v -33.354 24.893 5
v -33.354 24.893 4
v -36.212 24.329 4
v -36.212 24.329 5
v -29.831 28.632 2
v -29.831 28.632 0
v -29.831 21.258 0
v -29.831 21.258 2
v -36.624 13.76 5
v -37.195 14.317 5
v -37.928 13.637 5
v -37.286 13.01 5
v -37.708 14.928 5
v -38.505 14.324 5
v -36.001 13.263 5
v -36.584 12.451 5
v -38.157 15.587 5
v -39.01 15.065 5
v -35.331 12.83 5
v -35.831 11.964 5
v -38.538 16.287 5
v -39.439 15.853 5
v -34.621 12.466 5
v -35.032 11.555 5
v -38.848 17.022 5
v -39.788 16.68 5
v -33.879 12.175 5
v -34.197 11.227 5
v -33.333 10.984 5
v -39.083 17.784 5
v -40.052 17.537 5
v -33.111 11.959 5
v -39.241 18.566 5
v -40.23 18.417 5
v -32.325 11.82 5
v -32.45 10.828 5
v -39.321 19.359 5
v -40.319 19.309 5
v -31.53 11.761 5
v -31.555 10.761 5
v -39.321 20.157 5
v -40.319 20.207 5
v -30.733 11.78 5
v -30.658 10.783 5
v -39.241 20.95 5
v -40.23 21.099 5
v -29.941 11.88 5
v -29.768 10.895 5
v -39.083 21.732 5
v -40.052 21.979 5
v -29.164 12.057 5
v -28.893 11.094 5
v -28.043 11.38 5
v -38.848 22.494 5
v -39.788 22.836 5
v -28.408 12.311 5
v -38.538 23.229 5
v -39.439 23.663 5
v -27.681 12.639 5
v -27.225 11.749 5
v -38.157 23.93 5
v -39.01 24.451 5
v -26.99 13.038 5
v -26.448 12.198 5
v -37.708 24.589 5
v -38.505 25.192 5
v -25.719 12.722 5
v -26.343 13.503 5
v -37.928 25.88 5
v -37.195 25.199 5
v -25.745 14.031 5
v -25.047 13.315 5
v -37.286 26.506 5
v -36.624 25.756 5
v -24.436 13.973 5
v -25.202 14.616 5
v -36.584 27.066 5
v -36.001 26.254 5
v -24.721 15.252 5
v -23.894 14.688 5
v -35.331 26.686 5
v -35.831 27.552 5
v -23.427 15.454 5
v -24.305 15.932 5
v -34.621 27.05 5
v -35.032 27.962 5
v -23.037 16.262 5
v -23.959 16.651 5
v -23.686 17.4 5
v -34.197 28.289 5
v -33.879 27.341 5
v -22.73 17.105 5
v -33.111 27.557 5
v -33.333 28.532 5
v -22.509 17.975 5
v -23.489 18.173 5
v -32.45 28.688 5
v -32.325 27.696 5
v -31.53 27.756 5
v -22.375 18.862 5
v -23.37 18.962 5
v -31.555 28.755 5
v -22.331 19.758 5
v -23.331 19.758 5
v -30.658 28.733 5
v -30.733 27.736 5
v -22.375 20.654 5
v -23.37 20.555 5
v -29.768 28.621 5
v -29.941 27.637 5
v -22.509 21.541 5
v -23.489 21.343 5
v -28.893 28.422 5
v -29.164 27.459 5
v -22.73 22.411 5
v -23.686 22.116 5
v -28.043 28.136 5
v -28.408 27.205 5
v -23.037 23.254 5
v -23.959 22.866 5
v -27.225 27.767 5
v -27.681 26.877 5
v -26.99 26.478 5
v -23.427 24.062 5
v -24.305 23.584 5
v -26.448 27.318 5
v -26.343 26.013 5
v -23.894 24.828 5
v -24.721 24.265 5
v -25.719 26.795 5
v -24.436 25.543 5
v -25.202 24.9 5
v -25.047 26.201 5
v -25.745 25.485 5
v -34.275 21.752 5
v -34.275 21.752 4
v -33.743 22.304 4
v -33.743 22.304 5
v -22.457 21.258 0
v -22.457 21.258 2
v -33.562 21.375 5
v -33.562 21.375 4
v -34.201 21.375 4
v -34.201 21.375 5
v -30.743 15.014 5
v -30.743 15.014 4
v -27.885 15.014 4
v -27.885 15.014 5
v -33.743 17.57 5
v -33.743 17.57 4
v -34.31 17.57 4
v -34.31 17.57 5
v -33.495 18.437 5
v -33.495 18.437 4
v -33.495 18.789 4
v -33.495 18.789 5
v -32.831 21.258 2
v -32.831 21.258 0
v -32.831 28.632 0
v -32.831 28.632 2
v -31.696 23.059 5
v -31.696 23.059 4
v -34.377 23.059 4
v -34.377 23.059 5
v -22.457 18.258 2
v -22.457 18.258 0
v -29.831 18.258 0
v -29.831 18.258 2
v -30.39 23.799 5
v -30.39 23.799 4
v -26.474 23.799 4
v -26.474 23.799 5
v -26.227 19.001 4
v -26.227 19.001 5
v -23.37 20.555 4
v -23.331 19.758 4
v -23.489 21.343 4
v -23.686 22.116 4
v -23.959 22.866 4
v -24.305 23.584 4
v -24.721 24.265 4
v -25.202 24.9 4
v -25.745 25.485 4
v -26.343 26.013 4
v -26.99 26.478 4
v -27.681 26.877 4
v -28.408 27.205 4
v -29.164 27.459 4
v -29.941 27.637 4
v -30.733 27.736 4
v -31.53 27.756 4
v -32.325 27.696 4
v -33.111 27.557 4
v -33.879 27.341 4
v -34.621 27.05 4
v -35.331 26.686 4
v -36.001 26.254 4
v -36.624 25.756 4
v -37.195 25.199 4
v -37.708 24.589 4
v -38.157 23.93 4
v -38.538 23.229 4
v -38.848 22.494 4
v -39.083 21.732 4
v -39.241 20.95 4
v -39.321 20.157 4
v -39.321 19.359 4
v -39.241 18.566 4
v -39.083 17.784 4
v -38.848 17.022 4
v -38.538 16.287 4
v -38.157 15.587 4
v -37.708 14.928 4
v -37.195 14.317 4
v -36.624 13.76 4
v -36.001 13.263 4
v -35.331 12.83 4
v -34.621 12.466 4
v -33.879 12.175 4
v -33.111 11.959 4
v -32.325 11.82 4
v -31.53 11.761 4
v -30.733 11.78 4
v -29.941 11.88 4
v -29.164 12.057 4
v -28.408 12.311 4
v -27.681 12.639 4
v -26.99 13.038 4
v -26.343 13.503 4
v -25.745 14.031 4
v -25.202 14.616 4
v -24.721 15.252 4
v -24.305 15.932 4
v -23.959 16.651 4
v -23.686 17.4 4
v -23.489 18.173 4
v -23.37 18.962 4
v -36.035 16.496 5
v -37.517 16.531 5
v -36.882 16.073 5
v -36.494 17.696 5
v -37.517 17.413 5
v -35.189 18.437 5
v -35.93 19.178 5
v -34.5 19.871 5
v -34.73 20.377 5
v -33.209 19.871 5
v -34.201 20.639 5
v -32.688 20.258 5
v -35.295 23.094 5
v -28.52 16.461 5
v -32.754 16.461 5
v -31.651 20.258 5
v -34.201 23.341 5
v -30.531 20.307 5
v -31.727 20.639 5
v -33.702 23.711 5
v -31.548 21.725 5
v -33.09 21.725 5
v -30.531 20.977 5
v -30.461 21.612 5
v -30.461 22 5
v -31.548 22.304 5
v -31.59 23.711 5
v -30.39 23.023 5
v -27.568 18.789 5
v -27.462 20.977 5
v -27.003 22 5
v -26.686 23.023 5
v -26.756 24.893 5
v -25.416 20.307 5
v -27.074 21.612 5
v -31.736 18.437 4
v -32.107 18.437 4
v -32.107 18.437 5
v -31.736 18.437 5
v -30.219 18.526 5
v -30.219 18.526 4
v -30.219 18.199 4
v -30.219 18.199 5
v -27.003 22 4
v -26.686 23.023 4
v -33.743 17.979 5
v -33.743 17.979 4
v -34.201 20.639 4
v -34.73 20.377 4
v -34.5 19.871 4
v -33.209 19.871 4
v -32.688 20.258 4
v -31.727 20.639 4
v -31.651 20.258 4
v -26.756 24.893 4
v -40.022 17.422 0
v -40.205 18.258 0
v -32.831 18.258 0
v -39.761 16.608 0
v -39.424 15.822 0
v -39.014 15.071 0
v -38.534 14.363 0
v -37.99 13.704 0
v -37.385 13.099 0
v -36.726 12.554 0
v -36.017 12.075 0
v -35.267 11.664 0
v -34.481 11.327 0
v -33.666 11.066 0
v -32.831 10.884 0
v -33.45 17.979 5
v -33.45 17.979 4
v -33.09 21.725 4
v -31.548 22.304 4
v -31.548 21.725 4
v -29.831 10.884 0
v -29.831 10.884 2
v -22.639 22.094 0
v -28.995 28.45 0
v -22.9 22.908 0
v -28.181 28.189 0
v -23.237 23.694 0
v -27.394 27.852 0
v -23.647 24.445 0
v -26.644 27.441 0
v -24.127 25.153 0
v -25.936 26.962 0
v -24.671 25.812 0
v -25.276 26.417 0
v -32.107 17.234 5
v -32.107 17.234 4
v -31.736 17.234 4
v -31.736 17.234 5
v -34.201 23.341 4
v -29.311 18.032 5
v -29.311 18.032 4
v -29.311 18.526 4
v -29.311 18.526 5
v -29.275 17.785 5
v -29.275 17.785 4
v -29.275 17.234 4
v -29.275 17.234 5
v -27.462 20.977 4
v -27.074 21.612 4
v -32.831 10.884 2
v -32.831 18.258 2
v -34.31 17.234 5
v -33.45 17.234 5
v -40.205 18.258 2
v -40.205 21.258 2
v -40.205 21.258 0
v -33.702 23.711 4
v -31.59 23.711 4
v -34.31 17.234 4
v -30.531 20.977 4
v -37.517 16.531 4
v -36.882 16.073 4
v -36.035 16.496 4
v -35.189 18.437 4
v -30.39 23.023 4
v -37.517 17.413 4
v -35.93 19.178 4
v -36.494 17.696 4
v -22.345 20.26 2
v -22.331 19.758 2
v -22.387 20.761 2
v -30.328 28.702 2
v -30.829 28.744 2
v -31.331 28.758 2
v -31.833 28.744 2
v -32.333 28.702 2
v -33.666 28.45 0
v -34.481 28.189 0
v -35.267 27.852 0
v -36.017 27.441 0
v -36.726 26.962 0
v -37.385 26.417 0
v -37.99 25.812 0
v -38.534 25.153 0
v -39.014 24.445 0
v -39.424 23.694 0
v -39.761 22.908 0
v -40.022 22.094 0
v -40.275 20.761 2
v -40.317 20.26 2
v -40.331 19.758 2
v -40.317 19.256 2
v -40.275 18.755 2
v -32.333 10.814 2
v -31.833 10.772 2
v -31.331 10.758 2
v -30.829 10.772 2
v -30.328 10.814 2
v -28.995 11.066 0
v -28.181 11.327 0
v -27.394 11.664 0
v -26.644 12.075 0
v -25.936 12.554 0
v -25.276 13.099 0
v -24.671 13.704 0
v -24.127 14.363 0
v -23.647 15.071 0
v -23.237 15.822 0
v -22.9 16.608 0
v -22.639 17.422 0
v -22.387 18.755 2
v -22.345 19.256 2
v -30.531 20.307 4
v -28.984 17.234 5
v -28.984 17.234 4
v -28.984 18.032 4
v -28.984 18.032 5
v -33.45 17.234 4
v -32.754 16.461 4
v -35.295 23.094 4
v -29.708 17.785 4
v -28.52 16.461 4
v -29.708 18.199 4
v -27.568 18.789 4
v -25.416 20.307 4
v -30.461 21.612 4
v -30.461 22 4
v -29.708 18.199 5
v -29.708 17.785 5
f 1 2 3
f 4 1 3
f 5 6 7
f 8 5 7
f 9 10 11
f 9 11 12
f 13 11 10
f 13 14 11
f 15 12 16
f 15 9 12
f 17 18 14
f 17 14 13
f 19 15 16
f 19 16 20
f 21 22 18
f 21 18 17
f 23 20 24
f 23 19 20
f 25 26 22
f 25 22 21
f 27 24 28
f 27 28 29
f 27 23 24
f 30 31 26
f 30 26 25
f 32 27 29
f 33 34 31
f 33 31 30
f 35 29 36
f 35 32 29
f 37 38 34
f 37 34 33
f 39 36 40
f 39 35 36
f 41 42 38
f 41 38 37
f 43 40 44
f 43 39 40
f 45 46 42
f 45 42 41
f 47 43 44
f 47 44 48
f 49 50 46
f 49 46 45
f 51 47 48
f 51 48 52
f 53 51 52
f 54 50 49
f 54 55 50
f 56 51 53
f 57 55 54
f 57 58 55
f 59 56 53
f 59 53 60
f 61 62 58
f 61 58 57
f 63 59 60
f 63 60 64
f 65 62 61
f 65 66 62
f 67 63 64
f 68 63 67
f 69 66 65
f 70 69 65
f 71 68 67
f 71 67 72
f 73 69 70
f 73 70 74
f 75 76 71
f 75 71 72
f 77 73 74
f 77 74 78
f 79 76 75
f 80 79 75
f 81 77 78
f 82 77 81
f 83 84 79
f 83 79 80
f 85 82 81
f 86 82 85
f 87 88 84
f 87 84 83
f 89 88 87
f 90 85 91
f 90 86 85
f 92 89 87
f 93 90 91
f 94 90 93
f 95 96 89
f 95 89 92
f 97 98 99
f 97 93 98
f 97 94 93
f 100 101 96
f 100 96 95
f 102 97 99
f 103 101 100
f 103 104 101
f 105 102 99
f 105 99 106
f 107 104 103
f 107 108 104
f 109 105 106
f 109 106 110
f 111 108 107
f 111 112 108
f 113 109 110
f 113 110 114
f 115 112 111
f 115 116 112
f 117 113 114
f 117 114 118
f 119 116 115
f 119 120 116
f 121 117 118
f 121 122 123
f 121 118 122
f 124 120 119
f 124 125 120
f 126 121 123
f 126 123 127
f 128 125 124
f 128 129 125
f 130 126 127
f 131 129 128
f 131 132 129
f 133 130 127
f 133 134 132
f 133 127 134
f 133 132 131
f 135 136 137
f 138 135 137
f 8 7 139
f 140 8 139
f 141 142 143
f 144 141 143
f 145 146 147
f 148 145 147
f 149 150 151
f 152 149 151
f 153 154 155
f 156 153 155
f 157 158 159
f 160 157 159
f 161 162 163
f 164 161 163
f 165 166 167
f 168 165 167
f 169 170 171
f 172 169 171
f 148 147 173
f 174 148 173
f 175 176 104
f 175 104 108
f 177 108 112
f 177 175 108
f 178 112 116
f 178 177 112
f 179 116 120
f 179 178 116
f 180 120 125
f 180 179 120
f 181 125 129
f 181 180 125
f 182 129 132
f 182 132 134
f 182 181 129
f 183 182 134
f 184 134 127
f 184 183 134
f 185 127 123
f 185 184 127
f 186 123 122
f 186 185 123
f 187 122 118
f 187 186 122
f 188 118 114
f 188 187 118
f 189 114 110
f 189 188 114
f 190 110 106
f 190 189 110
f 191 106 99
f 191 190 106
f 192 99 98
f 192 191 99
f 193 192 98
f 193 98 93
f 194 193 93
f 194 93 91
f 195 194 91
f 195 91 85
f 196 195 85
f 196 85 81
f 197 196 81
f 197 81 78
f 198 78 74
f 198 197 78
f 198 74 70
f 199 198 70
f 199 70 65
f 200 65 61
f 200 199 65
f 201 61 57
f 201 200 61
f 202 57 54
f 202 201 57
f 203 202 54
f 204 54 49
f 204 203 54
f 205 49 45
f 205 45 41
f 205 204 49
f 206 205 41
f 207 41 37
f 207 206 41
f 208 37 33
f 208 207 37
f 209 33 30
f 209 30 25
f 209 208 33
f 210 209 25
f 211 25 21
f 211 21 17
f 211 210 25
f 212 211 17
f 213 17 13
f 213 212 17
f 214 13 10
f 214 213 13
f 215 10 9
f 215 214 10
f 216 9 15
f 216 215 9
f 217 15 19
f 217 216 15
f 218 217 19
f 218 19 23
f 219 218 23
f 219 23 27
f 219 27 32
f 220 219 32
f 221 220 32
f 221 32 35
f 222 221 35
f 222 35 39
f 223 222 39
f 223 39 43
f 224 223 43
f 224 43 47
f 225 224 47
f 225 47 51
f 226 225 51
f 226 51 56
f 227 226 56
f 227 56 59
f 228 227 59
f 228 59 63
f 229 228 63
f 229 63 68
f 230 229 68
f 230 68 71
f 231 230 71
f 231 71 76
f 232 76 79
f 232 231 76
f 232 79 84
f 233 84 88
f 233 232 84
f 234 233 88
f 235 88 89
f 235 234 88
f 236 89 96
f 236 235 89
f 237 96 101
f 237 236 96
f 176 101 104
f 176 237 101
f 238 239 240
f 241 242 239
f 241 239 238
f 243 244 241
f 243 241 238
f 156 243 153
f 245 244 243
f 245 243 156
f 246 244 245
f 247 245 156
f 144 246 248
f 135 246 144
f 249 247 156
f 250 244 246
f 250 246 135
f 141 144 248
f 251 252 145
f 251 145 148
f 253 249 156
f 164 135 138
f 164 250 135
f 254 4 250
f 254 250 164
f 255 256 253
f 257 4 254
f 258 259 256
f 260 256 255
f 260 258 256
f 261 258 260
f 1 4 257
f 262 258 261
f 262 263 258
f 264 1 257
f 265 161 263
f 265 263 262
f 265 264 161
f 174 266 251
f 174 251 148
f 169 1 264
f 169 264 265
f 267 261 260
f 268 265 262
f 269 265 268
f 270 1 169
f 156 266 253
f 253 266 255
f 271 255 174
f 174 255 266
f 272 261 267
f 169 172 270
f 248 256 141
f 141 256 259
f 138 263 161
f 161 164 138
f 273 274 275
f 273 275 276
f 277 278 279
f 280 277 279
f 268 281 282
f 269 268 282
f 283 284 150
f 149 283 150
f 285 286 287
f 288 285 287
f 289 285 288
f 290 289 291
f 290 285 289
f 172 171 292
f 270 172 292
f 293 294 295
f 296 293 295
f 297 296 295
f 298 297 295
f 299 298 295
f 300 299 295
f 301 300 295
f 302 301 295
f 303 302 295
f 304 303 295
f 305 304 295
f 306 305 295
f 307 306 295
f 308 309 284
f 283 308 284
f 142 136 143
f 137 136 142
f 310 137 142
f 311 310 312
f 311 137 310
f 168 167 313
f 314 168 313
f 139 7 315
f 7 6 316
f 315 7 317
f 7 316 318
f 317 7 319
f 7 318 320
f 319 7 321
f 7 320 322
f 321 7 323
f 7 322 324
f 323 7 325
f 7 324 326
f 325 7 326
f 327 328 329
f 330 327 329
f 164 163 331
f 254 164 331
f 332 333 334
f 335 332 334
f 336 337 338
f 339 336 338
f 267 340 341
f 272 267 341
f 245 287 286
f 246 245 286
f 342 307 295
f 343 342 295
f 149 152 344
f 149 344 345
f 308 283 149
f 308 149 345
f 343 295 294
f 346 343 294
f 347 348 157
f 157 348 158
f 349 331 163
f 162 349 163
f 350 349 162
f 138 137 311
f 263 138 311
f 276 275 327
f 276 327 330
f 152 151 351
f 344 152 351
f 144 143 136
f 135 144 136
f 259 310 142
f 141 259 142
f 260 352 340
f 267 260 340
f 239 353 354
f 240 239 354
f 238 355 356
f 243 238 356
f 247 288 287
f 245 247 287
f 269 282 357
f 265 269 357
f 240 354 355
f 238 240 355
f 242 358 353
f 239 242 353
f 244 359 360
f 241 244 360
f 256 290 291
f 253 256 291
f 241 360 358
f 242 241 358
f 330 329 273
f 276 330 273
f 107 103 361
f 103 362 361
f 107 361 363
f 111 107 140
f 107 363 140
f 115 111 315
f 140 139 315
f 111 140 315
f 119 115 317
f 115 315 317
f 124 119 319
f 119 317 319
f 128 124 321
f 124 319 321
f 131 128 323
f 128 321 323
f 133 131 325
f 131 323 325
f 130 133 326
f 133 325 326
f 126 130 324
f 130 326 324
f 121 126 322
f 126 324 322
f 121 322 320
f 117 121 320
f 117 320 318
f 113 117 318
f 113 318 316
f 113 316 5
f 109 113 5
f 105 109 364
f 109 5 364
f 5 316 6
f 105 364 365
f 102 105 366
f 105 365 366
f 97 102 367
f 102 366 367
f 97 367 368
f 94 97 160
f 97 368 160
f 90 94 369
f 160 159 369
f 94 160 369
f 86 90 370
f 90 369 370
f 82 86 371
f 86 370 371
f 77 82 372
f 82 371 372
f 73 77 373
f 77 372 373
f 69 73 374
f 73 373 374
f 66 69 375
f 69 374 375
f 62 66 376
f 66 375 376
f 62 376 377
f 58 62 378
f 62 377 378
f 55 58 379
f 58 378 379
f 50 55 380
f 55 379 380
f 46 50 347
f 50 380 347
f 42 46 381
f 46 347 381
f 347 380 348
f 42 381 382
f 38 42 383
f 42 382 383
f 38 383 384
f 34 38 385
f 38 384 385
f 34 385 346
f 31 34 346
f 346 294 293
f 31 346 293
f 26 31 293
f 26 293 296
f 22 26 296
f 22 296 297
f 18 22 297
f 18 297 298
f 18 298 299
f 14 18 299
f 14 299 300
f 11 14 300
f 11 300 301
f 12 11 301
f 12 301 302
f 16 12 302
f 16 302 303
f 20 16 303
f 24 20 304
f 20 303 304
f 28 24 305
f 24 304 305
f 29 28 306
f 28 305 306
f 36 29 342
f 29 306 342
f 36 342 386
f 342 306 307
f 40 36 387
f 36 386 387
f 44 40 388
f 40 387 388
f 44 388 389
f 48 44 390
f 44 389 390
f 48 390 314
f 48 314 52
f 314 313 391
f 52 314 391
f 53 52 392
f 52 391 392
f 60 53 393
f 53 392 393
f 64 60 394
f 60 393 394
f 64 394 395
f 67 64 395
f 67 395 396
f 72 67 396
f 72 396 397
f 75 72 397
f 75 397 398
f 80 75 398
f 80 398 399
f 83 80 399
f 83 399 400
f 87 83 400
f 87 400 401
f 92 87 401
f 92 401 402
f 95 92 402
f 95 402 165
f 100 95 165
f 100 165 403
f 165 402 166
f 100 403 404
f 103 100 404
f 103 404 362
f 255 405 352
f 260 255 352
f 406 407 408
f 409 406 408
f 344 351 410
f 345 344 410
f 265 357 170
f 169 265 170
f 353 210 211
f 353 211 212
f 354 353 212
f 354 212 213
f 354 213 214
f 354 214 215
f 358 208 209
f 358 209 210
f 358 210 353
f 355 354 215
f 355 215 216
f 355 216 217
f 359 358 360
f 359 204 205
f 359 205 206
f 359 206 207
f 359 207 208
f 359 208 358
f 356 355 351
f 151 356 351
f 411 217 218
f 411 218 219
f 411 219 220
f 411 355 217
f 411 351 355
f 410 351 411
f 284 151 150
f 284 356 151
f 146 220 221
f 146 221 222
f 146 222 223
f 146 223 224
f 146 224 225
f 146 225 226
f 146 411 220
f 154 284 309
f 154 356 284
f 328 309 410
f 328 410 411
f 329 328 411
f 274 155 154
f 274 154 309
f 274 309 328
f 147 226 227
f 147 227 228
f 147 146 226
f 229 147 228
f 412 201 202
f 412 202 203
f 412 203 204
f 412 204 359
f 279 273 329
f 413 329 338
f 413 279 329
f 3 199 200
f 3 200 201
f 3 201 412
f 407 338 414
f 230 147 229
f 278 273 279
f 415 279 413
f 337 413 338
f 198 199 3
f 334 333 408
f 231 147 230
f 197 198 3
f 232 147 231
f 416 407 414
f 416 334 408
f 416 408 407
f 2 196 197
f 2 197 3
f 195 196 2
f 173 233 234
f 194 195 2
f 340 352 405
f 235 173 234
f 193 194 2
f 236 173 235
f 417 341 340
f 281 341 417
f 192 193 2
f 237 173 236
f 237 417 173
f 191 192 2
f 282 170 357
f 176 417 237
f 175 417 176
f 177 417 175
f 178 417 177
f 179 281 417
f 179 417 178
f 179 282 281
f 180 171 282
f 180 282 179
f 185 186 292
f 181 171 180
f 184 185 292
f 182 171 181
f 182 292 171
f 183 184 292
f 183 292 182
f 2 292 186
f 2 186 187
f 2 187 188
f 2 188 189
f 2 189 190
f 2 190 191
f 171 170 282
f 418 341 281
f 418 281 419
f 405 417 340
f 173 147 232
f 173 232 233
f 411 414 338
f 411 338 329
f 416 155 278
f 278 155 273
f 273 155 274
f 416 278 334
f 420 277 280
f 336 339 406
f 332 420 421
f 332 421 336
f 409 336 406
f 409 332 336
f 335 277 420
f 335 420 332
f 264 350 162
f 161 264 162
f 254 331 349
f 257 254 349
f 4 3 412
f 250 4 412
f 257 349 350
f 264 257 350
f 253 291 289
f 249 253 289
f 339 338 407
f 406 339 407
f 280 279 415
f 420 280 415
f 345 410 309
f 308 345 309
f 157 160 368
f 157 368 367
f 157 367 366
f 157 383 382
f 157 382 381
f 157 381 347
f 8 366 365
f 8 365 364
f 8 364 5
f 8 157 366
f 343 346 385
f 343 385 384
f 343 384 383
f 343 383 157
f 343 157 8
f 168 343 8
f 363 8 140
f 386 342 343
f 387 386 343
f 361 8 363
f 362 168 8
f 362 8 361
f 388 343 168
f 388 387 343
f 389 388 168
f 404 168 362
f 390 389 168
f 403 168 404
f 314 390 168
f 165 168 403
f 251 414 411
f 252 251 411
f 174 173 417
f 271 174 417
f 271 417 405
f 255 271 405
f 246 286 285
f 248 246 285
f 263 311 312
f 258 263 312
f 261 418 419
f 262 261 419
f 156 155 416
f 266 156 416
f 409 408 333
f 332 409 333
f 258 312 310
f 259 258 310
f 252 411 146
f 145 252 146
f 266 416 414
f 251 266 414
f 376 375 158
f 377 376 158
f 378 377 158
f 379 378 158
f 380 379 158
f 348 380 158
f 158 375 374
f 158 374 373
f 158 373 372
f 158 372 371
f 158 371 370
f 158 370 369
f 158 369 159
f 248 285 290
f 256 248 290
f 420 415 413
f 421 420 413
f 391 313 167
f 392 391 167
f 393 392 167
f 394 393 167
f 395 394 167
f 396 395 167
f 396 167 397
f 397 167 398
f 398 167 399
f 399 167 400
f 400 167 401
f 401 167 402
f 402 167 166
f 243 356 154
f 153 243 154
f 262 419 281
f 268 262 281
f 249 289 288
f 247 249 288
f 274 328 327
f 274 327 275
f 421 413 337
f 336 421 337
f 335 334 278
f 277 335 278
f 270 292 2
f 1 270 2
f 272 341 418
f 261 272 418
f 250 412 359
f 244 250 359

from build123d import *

# Parameters (mm, degrees)
F0_R     = 9
F1_DEPTH = 4
F2_W     = 3
F2_H     = 3
F3_DEPTH = 2
F5_R     = 9
F5_R_2   = 8
F5_W     = 0.3704614937
F5_H     = 1.2024026364
F4_DEPTH = 1


with BuildPart() as f1:
    # F0 (on Top) → F1 (new body)
    with BuildSketch(Plane.XY):
        with Locations((-31.3306450844, 19.7580661625)):
            Circle(F0_R)
    extrude(amount=F1_DEPTH)

    # F2 (on face) → F3 (cut)
    with BuildSketch(Plane(origin=(0, 0, 0), x_dir=(1, 0, 0), z_dir=(0, 0, -1))):
        with BuildLine():
            ThreePointArc((-32.8306450844, -28.6321858371), (-32.0832814269, -28.7265408676), (-31.3306450844, -28.7580661625))
            ThreePointArc((-31.3306450844, -28.7580661625), (-30.5780087419, -28.7265408676), (-29.8306450844, -28.6321858371))
            Line((-29.8306450844, -28.6321858371), (-29.8306450844, -21.2580661625))
            Line((-29.8306450844, -21.2580661625), (-32.8306450844, -21.2580661625))
            Line((-32.8306450844, -21.2580661625), (-32.8306450844, -28.6321858371))
        make_face()
        with BuildLine():
            ThreePointArc((-40.204764759, -18.2580661625), (-40.2991197895, -19.0054298199), (-40.3306450844, -19.7580661625))
            ThreePointArc((-40.3306450844, -19.7580661625), (-40.2991197895, -20.510702505), (-40.204764759, -21.2580661625))
            Line((-40.204764759, -21.2580661625), (-32.8306450844, -21.2580661625))
            Line((-32.8306450844, -21.2580661625), (-32.8306450844, -18.2580661625))
            Line((-32.8306450844, -18.2580661625), (-40.204764759, -18.2580661625))
        make_face()
        with Locations((-31.3306450844, -19.7580661625)):
            Rectangle(F2_W, F2_H)
        with BuildLine():
            Line((-29.8306450844, -18.2580661625), (-29.8306450844, -21.2580661625))
            Line((-29.8306450844, -21.2580661625), (-22.4565254097, -21.2580661625))
            ThreePointArc((-22.4565254097, -21.2580661625), (-22.3621703793, -20.510702505), (-22.3306450844, -19.7580661625))
            ThreePointArc((-22.3306450844, -19.7580661625), (-22.3621703793, -19.0054298199), (-22.4565254097, -18.2580661625))
            Line((-22.4565254097, -18.2580661625), (-29.8306450844, -18.2580661625))
        make_face()
        with BuildLine():
            Line((-32.8306450844, -10.8839464878), (-32.8306450844, -18.2580661625))
            Line((-32.8306450844, -18.2580661625), (-29.8306450844, -18.2580661625))
            Line((-29.8306450844, -18.2580661625), (-29.8306450844, -10.8839464878))
            ThreePointArc((-29.8306450844, -10.8839464878), (-30.5780087419, -10.7895914574), (-31.3306450844, -10.7580661625))
            ThreePointArc((-31.3306450844, -10.7580661625), (-32.0832814269, -10.7895914574), (-32.8306450844, -10.8839464878))
        make_face()
    extrude(amount=-F3_DEPTH, mode=Mode.SUBTRACT)

    # F5 (on face) → F4 (join)
    with BuildSketch(Plane.XY.offset(4)):
        with Locations((-31.3306450844, 19.7580661625)):
            Circle(F5_R)
        with Locations((-31.3306450844, 19.7580661625)):
            Circle(F5_R_2, mode=Mode.SUBTRACT)
        Polygon((-33.3540178835, 24.8932279646), (-36.2118817866, 24.328712374), (-35.2945402265, 23.0938345194), (-35.929620266, 19.1775020212), (-36.4941395819, 17.6956485957), (-37.51732409, 17.4133908004), (-37.51732409, 16.5313333273), (-36.8822440505, 16.0726644099), (-36.0354706645, 16.4960511029), (-35.1886935532, 18.4365753084), (-33.4951467812, 18.4365753084), (-33.4951467812, 18.7893975526), (-27.5677256286, 18.7893975526), (-28.5203475505, 16.4607688785), (-32.7542200685, 16.4607688785), (-30.7431295514, 15.0141958147), (-27.885267511, 15.0141958147), (-26.2270011008, 19.0010908991), (-25.4155080765, 20.3065350652), (-30.5314362049, 20.3065350652), (-30.5314362049, 20.9768973291), (-27.4618789554, 20.9768973291), (-27.0737744868, 21.6119792312), (-30.4608717561, 21.6119792312), (-30.4608717561, 22.0000836998), (-27.0032100379, 22.0000836998), (-26.6856700182, 23.0232700706), (-30.3903073072, 23.0232700706), (-30.3903073072, 23.7994790077), (-26.4739766717, 23.7994790077), (-26.756234467, 24.8932279646), align=None)
        Polygon((-34.499656409, 19.8707804084), (-34.7300246358, 20.377099514), (-34.2007912695, 20.6392026472), (-31.7267395564, 20.6392026472), (-31.6514596343, 20.258097545), (-32.6876805022, 20.258097545), (-33.209066838, 19.8707804084), align=None, mode=Mode.SUBTRACT)
        Polygon((-34.2753518545, 21.7523517899), (-33.7431058288, 22.3036166281), (-31.5476171672, 22.3036166281), (-31.5476171672, 21.7250771821), (-33.0903939903, 21.7250771821), (-33.5618001374, 21.3748883364), (-34.2007912695, 21.3748883364), align=None, mode=Mode.SUBTRACT)
        Polygon((-34.3772023916, 23.058552295), (-34.2007912695, 23.3408100903), (-33.7020926227, 23.7112734467), (-31.5899029374, 23.7112734467), (-31.6957496107, 23.058552295), align=None, mode=Mode.SUBTRACT)
        Polygon((-33.7434709072, 17.5698362291), (-34.3099012971, 17.5698362291), (-34.3099012971, 17.234172672), (-33.4497652948, 17.234172672), (-33.4497652948, 17.9789252579), (-33.7434709072, 17.9789252579), align=None)
        with Locations((-31.9214742631, 17.8353739902)):
            Rectangle(F5_W, F5_H)
        Polygon((-29.3105877936, 18.5256265104), (-30.2191060036, 18.5256265104), (-30.2191060036, 18.1992650032), (-29.707511887, 18.1992650032), (-29.707511887, 17.784697935), (-29.2753055692, 17.784697935), (-29.2753055692, 17.234172672), (-28.9842262864, 17.234172672), (-28.9842262864, 18.0316753685), (-29.3105877936, 18.0316753685), align=None)
    extrude(amount=F4_DEPTH)


solid = f1.part
